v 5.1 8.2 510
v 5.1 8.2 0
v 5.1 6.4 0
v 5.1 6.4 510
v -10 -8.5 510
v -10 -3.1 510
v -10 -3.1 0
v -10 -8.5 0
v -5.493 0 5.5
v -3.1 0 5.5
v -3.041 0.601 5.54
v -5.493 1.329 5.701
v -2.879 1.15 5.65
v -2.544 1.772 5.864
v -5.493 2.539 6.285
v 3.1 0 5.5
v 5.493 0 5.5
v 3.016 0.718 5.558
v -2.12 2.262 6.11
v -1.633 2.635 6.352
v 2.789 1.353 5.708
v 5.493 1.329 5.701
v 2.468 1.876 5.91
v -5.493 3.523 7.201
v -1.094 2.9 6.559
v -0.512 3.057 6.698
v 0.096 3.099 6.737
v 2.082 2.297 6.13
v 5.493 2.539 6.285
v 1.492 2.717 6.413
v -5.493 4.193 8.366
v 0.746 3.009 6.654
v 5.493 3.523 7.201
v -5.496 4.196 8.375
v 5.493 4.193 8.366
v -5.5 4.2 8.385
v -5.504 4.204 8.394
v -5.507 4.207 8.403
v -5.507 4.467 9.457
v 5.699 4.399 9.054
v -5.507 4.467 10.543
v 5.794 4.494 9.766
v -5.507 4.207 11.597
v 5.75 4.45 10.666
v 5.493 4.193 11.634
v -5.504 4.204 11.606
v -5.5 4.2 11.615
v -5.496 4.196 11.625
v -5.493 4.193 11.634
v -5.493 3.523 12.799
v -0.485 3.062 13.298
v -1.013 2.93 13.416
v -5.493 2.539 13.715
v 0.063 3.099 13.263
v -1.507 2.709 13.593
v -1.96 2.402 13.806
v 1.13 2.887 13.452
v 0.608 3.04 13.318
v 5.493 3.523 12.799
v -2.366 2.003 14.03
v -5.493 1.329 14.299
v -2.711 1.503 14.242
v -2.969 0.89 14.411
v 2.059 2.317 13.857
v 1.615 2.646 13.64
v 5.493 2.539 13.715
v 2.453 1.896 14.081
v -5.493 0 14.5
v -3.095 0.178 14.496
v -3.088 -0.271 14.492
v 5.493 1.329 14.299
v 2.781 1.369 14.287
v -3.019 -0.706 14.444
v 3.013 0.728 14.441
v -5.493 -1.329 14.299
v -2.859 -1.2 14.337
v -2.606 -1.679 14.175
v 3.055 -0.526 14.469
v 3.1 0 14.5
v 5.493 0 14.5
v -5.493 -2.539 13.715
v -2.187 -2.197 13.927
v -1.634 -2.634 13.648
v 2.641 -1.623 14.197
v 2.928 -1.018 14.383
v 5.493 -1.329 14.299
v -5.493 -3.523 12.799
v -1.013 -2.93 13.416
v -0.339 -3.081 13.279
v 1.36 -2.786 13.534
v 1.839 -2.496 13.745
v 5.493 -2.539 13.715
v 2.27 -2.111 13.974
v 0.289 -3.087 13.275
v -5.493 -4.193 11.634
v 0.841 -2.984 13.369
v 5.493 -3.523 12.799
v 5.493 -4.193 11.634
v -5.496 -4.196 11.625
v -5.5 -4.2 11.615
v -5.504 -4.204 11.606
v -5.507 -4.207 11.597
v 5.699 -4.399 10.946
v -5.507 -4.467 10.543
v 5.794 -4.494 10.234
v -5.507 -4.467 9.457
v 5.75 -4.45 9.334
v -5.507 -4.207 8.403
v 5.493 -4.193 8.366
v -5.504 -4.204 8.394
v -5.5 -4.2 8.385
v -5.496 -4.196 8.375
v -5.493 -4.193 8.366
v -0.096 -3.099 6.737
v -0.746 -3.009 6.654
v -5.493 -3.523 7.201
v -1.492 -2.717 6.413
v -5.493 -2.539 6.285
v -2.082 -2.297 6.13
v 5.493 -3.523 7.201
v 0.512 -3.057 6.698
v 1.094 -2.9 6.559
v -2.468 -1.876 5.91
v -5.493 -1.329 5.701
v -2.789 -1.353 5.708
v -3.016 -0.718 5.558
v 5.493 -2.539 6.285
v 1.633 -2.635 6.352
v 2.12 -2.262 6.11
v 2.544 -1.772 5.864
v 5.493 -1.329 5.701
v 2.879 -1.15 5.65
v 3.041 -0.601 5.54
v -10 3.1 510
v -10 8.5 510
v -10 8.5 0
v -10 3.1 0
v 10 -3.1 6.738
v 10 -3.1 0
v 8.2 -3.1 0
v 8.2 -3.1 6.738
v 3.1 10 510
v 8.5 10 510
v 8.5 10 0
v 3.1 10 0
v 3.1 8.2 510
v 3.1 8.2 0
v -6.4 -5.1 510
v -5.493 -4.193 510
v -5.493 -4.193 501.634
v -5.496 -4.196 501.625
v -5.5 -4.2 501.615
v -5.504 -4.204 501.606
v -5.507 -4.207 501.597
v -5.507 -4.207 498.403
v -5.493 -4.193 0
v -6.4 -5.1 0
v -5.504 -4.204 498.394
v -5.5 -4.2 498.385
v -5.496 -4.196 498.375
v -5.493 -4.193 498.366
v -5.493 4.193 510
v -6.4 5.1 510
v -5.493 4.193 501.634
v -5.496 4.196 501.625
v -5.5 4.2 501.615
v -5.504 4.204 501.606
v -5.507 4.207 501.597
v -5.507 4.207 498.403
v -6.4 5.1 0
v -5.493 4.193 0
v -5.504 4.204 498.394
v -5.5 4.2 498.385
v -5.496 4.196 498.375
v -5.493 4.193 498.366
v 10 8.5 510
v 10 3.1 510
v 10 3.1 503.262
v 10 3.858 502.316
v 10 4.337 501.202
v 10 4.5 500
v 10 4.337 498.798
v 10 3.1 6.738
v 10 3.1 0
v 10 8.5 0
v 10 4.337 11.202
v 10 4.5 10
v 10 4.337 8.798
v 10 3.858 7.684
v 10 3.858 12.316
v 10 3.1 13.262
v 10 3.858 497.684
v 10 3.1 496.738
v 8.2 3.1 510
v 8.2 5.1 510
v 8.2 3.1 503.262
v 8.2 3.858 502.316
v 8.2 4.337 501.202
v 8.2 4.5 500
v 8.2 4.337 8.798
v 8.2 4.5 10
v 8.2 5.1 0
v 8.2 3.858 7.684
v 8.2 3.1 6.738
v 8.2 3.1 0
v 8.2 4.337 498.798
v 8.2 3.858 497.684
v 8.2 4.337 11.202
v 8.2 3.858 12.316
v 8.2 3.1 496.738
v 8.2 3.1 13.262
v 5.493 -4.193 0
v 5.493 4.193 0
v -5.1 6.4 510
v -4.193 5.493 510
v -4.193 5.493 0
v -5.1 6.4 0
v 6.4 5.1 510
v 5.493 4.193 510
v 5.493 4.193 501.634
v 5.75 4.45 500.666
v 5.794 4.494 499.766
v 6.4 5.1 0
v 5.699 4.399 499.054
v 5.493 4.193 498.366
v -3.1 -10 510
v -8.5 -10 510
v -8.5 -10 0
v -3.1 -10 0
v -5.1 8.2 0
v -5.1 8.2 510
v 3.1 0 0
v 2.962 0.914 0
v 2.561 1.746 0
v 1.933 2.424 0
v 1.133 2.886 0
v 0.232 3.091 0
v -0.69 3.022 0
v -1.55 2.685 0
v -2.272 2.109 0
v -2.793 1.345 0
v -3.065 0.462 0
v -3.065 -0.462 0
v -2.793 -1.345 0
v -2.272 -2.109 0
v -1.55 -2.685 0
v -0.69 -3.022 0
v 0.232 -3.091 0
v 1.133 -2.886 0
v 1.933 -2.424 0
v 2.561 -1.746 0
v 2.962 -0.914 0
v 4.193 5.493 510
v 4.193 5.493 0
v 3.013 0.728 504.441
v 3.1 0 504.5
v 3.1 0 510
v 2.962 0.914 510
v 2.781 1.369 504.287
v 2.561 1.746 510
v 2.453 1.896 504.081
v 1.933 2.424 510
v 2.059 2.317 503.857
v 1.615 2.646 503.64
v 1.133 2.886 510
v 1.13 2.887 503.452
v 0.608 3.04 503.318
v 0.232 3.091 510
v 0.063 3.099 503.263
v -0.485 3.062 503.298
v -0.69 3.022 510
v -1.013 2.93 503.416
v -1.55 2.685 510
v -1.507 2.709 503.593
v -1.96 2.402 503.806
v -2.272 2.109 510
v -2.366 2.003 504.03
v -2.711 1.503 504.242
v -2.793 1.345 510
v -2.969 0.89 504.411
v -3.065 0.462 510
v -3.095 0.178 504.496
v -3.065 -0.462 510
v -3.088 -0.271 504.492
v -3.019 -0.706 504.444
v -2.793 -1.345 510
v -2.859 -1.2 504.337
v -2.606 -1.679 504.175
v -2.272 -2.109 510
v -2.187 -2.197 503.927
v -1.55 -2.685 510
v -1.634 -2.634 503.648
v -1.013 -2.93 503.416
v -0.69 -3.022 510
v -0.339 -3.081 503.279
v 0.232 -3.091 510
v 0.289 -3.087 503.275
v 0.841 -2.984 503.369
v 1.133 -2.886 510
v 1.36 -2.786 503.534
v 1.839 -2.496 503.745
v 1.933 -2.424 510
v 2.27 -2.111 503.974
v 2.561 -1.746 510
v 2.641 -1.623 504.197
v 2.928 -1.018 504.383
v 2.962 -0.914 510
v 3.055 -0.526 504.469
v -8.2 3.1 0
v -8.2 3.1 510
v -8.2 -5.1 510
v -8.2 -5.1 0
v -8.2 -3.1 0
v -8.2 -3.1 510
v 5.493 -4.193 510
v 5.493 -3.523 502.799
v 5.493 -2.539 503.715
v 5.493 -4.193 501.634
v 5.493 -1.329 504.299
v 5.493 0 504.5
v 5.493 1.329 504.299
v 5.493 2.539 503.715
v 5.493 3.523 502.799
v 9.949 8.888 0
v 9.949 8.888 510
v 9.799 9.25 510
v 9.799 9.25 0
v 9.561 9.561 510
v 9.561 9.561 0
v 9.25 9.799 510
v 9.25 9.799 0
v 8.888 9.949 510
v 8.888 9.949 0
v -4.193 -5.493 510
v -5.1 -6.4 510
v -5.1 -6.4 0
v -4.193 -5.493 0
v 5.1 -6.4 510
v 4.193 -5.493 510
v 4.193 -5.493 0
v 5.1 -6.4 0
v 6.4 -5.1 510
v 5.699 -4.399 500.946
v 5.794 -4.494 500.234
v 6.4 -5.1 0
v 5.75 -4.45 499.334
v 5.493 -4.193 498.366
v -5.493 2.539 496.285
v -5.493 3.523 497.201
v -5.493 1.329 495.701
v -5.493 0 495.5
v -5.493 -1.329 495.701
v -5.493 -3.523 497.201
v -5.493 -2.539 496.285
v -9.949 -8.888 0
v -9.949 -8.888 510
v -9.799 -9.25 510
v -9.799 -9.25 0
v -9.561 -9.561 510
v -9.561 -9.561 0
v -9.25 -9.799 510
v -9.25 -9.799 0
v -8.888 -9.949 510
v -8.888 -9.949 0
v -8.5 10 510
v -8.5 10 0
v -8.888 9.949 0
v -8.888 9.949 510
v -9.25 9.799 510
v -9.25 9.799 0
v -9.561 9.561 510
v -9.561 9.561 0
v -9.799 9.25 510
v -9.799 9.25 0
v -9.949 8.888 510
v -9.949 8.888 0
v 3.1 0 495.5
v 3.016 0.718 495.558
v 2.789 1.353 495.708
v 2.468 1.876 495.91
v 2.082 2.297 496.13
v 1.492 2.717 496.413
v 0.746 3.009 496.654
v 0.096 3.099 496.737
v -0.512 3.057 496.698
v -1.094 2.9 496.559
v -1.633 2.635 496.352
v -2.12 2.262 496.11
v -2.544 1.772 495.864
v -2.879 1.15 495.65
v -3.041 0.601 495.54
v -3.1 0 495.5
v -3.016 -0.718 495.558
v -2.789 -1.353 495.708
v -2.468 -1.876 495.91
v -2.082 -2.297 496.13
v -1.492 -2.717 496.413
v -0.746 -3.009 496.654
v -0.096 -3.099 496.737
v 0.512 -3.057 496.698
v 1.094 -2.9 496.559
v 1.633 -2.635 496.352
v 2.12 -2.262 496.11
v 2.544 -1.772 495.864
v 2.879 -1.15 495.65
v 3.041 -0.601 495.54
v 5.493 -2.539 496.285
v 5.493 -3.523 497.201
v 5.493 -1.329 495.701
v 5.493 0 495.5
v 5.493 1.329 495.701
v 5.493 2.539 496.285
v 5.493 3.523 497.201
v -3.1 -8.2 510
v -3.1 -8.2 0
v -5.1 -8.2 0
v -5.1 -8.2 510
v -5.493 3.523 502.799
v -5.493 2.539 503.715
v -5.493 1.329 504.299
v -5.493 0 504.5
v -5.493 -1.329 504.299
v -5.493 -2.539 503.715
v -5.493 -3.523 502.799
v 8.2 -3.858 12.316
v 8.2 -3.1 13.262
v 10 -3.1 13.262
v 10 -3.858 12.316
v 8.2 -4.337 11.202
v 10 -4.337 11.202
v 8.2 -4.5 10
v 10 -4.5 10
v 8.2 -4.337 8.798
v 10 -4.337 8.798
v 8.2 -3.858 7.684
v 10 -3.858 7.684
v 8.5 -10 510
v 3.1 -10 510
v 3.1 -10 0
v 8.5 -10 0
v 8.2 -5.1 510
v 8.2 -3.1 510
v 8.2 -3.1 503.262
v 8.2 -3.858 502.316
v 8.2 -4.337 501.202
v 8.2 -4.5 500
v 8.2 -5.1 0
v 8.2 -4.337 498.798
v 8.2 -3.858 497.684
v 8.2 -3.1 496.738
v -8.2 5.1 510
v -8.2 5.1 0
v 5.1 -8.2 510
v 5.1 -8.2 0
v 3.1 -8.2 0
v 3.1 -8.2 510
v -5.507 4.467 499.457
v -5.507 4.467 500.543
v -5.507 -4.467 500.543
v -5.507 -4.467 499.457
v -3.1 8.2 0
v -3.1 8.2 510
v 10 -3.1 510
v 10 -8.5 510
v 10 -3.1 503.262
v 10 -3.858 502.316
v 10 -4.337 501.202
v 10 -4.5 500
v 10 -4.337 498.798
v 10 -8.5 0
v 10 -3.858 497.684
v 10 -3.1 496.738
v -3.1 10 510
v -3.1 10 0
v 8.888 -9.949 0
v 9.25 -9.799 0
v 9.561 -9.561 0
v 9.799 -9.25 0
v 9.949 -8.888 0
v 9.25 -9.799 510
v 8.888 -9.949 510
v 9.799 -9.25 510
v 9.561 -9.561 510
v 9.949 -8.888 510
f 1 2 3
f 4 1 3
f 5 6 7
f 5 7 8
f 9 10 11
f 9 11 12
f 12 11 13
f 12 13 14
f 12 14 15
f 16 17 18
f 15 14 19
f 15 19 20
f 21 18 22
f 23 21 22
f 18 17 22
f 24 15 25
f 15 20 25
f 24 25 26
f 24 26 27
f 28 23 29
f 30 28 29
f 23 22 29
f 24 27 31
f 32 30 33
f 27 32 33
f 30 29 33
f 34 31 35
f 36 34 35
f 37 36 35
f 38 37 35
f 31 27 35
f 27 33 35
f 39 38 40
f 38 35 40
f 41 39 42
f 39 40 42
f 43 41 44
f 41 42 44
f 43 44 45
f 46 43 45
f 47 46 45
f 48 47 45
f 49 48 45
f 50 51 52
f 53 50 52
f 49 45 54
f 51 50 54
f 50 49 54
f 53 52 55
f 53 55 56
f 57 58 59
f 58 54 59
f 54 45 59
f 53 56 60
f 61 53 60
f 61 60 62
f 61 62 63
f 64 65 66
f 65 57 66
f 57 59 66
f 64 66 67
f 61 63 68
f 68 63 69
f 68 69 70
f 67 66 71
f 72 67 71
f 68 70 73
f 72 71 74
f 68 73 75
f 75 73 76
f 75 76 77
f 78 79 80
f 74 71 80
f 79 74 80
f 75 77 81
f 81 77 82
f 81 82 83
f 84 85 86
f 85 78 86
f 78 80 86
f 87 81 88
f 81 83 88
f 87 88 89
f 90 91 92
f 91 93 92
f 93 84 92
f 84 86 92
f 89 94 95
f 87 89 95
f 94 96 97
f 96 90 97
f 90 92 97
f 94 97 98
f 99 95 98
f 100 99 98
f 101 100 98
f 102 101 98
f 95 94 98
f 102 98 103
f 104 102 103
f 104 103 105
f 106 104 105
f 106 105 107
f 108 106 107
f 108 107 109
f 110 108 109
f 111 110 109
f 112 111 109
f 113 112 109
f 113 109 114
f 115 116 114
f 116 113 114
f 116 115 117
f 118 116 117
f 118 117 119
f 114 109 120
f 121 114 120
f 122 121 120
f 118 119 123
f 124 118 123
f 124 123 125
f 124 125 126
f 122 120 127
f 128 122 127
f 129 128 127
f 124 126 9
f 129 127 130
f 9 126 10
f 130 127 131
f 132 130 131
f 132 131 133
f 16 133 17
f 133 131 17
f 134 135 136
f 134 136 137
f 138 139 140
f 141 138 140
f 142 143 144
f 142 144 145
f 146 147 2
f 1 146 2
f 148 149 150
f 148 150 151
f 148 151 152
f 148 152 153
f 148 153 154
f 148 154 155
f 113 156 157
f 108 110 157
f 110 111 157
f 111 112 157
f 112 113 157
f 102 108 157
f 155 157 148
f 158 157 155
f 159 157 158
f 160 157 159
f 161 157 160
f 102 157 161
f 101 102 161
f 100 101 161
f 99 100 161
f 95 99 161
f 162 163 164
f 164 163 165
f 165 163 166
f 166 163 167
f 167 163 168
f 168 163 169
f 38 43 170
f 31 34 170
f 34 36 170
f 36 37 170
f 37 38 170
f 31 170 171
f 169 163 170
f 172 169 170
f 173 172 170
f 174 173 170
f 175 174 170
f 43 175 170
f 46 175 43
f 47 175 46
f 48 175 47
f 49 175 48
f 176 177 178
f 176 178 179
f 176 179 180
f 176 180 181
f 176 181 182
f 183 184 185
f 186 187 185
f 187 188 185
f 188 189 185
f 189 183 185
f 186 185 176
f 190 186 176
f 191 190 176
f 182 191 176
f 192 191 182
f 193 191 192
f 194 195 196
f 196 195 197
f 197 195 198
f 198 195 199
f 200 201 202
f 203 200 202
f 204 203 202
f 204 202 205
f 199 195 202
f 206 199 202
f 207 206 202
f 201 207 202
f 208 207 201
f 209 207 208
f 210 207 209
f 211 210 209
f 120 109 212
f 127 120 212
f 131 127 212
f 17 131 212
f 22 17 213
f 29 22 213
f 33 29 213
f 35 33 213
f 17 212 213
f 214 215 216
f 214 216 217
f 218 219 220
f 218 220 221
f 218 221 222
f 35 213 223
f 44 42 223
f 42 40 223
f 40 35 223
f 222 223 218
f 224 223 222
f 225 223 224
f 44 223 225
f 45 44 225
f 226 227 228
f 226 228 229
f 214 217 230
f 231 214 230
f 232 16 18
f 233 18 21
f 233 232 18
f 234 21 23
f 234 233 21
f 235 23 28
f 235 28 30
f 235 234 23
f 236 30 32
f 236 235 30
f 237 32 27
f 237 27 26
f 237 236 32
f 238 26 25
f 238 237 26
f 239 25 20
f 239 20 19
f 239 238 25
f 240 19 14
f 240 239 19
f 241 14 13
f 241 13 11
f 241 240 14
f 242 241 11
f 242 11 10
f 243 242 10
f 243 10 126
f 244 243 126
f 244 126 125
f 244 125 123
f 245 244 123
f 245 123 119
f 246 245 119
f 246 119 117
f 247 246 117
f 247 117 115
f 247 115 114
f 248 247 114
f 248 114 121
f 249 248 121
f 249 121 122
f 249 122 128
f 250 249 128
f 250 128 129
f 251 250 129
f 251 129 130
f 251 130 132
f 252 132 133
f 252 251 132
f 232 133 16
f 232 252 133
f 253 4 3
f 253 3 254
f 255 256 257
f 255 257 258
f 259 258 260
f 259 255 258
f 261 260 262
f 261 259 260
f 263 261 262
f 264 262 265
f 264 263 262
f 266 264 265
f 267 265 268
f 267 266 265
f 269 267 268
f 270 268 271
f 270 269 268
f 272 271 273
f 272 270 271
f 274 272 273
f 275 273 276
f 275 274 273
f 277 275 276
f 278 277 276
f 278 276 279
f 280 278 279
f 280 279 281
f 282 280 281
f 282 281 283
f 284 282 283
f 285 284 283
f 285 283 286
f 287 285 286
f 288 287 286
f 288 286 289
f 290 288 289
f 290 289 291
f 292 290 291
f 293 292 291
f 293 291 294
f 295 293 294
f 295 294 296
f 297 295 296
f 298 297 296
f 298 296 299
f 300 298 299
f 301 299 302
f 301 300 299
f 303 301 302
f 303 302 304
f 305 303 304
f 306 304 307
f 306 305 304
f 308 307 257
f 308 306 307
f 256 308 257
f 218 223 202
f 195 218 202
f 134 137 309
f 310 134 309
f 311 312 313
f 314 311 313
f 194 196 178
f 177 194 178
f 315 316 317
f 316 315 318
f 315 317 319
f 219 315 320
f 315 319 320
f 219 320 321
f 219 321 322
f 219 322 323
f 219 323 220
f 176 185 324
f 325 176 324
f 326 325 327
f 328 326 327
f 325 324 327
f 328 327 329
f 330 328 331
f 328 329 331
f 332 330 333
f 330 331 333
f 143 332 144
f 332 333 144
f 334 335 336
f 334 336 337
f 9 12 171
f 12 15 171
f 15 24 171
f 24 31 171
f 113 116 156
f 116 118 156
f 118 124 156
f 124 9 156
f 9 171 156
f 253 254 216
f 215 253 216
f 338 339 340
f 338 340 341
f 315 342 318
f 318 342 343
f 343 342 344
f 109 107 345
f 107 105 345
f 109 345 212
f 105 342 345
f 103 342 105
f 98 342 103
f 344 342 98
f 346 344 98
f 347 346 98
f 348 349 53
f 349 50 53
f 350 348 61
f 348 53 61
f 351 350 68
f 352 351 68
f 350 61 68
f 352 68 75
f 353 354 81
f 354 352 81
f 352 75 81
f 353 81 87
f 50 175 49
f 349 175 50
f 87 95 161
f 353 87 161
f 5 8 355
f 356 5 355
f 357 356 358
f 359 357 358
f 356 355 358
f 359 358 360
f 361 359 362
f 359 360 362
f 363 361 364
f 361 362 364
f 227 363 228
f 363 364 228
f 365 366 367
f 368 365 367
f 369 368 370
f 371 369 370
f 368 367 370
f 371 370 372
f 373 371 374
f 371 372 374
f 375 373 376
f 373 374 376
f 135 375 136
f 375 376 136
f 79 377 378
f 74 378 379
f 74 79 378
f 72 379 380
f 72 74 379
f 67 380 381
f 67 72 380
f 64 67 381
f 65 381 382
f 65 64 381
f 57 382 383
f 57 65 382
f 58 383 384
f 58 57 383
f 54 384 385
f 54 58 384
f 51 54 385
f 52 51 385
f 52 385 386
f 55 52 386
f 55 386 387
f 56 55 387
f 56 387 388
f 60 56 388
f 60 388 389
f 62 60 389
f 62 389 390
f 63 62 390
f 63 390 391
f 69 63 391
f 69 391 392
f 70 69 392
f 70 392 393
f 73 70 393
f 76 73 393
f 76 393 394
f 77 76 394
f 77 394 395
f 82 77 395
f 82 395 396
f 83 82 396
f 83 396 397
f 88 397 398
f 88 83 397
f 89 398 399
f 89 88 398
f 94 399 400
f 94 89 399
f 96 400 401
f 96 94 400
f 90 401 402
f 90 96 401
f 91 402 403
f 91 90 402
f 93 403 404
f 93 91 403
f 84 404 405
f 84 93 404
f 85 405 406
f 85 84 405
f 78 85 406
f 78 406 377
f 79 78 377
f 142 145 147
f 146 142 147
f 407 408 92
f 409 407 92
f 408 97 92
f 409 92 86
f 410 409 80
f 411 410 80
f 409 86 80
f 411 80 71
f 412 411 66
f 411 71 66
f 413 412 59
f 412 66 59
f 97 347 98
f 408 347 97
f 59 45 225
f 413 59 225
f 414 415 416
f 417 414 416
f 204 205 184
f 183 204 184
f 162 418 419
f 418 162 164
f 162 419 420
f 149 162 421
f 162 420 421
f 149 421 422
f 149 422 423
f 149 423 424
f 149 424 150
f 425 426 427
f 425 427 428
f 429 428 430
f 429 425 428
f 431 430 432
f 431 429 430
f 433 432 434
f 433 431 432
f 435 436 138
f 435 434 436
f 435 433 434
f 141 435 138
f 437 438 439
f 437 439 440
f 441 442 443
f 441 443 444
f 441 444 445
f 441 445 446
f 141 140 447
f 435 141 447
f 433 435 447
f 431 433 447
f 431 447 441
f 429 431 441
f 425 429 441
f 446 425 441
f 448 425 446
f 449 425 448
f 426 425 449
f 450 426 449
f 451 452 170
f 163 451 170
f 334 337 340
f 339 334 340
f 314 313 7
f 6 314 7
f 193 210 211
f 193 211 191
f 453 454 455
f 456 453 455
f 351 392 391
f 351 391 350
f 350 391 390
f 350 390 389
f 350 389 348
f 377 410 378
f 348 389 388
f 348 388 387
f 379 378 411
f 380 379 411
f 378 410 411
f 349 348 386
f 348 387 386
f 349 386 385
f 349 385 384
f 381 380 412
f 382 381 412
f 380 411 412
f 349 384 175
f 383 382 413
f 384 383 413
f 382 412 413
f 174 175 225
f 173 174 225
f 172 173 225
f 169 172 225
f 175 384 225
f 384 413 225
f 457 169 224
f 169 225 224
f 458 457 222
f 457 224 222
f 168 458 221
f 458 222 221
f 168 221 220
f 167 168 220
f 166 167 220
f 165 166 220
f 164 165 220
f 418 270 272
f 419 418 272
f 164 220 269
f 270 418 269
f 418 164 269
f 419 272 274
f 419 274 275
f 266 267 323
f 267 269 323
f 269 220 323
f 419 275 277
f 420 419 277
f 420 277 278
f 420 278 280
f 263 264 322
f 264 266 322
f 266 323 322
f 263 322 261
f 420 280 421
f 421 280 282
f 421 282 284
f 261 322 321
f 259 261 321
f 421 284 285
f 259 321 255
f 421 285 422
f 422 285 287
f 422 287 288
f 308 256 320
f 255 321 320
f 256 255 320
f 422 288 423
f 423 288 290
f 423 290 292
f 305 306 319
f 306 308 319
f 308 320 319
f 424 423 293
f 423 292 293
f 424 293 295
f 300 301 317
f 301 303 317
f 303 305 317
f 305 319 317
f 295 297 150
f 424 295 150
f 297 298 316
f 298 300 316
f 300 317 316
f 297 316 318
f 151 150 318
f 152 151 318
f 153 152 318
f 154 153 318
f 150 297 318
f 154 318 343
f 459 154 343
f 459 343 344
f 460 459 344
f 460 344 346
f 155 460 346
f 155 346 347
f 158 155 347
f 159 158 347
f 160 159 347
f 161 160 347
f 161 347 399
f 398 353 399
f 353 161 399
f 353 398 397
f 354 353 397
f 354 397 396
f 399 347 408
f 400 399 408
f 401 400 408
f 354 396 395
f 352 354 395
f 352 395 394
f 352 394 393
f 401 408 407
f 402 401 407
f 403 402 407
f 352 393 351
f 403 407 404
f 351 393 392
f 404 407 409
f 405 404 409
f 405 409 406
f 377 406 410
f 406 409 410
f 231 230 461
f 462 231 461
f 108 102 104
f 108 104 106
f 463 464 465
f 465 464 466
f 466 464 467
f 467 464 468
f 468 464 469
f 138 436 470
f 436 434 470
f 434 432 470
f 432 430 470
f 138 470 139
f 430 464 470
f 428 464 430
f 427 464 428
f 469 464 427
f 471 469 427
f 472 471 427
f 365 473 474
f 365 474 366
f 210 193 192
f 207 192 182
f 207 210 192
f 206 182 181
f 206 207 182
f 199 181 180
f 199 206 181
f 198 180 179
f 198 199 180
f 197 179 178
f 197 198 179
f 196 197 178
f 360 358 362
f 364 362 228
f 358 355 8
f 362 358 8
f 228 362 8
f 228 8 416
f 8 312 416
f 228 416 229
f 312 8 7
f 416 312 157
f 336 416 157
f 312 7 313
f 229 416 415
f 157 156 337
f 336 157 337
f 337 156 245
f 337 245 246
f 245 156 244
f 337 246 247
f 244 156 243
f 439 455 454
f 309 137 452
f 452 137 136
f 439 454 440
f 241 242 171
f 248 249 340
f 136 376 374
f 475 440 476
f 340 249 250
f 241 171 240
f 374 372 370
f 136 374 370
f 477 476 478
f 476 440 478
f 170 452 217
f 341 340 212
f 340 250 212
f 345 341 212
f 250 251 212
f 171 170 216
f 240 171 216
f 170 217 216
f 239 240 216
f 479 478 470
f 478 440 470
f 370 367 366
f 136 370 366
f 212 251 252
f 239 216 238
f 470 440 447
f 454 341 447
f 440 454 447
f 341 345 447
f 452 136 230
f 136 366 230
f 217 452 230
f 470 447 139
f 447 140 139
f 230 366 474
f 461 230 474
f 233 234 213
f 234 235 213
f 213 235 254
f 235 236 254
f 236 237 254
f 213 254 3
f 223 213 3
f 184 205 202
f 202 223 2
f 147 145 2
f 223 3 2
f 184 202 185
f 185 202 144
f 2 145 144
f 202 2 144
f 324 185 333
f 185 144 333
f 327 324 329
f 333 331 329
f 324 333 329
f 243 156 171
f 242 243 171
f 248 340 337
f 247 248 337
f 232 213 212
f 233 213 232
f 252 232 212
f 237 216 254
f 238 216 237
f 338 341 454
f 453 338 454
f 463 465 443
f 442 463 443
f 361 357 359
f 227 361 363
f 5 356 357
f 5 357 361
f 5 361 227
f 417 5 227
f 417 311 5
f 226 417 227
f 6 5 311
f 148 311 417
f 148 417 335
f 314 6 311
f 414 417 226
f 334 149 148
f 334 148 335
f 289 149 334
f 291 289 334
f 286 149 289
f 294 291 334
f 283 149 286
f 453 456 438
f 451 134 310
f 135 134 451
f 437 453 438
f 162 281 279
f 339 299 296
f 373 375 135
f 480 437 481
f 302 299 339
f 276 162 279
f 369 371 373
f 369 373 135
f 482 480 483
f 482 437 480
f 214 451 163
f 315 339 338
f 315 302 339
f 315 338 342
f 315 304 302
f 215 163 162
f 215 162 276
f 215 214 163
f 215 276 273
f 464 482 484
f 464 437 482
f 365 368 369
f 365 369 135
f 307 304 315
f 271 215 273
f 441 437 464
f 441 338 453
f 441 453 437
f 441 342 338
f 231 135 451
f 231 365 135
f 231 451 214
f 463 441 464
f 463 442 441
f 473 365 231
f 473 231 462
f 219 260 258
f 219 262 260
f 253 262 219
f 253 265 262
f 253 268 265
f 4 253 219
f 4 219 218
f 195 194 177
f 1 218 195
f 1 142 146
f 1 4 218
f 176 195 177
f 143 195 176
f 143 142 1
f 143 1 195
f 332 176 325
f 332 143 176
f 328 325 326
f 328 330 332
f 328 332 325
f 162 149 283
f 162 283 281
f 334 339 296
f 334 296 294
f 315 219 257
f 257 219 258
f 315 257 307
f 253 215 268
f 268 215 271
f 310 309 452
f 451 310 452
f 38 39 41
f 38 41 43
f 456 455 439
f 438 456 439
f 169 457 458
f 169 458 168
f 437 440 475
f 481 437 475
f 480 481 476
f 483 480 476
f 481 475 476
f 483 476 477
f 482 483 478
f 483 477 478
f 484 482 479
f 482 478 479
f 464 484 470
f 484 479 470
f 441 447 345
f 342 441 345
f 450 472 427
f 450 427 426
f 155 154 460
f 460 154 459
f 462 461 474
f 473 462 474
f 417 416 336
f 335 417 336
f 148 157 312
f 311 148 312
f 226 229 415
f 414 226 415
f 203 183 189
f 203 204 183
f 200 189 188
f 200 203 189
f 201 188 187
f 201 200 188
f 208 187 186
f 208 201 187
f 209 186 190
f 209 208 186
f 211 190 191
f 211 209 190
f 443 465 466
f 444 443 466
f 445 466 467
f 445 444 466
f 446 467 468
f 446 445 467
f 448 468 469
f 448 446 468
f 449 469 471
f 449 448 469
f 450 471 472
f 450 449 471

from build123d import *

# Parameters (mm, degrees)
SKETCH1_R               = 3.1
BOSS_EXTRUDE1_DEPTH     = 510
SKETCH3_R               = 4.5
CUT_EXTRUDE2_DEPTH      = 5.507107651
CUT_EXTRUDE2_DEPTH_BACK = 11


with BuildPart() as part:
    # Sketch1 → Boss-Extrude1 (new body)
    with BuildSketch(Plane.XY):
        with BuildLine():
            Line((-10, 3.1), (-8.2, 3.1))
            Line((-8.2, 3.1), (-8.2, 5.1))
            Line((-8.2, 5.1), (-6.4, 5.1))
            Line((-6.4, 5.1), (-5.492892349, 4.192892349))
            Line((-5.492892349, 4.192892349), (-5.492892349, -4.192892349))
            Line((-5.492892349, -4.192892349), (-6.4, -5.1))
            Line((-6.4, -5.1), (-8.2, -5.1))
            Line((-8.2, -5.1), (-8.2, -3.1))
            Line((-8.2, -3.1), (-10, -3.1))
            Line((-10, -3.1), (-10, -8.5))
            ThreePointArc((-10, -8.5), (-9.560660172, -9.560660172), (-8.5, -10))
            Line((-8.5, -10), (-3.1, -10))
            Line((-3.1, -10), (-3.1, -8.2))
            Line((-3.1, -8.2), (-5.1, -8.2))
            Line((-5.1, -8.2), (-5.1, -6.4))
            Line((-5.1, -6.4), (-4.192892349, -5.492892349))
            Line((-4.192892349, -5.492892349), (4.192892349, -5.492892349))
            Line((4.192892349, -5.492892349), (5.1, -6.4))
            Line((5.1, -6.4), (5.1, -8.2))
            Line((5.1, -8.2), (3.1, -8.2))
            Line((3.1, -8.2), (3.1, -10))
            Line((3.1, -10), (8.5, -10))
            ThreePointArc((8.5, -10), (9.560660172, -9.560660172), (10, -8.5))
            Line((10, -8.5), (10, -3.1))
            Line((10, -3.1), (8.2, -3.1))
            Line((8.2, -3.1), (8.2, -5.1))
            Line((8.2, -5.1), (6.4, -5.1))
            Line((6.4, -5.1), (5.492892349, -4.192892349))
            Line((5.492892349, -4.192892349), (5.492892349, 4.192892349))
            Line((5.492892349, 4.192892349), (6.4, 5.1))
            Line((6.4, 5.1), (8.2, 5.1))
            Line((8.2, 5.1), (8.2, 3.1))
            Line((8.2, 3.1), (10, 3.1))
            Line((10, 3.1), (10, 8.5))
            ThreePointArc((10, 8.5), (9.560660172, 9.560660172), (8.5, 10))
            Line((8.5, 10), (3.1, 10))
            Line((3.1, 10), (3.1, 8.2))
            Line((3.1, 8.2), (5.1, 8.2))
            Line((5.1, 8.2), (5.1, 6.4))
            Line((5.1, 6.4), (4.192892349, 5.492892349))
            Line((4.192892349, 5.492892349), (-4.192892349, 5.492892349))
            Line((-4.192892349, 5.492892349), (-5.1, 6.4))
            Line((-5.1, 6.4), (-5.1, 8.2))
            Line((-5.1, 8.2), (-3.1, 8.2))
            Line((-3.1, 8.2), (-3.1, 10))
            Line((-3.1, 10), (-8.5, 10))
            ThreePointArc((-8.5, 10), (-9.560660172, 9.560660172), (-10, 8.5))
            Line((-10, 8.5), (-10, 3.1))
        make_face()
        Circle(SKETCH1_R, mode=Mode.SUBTRACT)
    extrude(amount=BOSS_EXTRUDE1_DEPTH)

    # Sketch3 → Cut-Extrude2 (cut, two sides)
    with BuildSketch(Plane(origin=(5.492892349, 0, 0), x_dir=(0, 0, -1), z_dir=(1, 0, 0))) as cut_extrude2_sk:
        with Locations((-10, 0)):
            Circle(SKETCH3_R)
        with Locations((-500, 0)):
            Circle(SKETCH3_R)
    extrude(amount=CUT_EXTRUDE2_DEPTH, mode=Mode.SUBTRACT)
    extrude(cut_extrude2_sk.sketch, amount=-CUT_EXTRUDE2_DEPTH_BACK, mode=Mode.SUBTRACT)


solid = part.part
